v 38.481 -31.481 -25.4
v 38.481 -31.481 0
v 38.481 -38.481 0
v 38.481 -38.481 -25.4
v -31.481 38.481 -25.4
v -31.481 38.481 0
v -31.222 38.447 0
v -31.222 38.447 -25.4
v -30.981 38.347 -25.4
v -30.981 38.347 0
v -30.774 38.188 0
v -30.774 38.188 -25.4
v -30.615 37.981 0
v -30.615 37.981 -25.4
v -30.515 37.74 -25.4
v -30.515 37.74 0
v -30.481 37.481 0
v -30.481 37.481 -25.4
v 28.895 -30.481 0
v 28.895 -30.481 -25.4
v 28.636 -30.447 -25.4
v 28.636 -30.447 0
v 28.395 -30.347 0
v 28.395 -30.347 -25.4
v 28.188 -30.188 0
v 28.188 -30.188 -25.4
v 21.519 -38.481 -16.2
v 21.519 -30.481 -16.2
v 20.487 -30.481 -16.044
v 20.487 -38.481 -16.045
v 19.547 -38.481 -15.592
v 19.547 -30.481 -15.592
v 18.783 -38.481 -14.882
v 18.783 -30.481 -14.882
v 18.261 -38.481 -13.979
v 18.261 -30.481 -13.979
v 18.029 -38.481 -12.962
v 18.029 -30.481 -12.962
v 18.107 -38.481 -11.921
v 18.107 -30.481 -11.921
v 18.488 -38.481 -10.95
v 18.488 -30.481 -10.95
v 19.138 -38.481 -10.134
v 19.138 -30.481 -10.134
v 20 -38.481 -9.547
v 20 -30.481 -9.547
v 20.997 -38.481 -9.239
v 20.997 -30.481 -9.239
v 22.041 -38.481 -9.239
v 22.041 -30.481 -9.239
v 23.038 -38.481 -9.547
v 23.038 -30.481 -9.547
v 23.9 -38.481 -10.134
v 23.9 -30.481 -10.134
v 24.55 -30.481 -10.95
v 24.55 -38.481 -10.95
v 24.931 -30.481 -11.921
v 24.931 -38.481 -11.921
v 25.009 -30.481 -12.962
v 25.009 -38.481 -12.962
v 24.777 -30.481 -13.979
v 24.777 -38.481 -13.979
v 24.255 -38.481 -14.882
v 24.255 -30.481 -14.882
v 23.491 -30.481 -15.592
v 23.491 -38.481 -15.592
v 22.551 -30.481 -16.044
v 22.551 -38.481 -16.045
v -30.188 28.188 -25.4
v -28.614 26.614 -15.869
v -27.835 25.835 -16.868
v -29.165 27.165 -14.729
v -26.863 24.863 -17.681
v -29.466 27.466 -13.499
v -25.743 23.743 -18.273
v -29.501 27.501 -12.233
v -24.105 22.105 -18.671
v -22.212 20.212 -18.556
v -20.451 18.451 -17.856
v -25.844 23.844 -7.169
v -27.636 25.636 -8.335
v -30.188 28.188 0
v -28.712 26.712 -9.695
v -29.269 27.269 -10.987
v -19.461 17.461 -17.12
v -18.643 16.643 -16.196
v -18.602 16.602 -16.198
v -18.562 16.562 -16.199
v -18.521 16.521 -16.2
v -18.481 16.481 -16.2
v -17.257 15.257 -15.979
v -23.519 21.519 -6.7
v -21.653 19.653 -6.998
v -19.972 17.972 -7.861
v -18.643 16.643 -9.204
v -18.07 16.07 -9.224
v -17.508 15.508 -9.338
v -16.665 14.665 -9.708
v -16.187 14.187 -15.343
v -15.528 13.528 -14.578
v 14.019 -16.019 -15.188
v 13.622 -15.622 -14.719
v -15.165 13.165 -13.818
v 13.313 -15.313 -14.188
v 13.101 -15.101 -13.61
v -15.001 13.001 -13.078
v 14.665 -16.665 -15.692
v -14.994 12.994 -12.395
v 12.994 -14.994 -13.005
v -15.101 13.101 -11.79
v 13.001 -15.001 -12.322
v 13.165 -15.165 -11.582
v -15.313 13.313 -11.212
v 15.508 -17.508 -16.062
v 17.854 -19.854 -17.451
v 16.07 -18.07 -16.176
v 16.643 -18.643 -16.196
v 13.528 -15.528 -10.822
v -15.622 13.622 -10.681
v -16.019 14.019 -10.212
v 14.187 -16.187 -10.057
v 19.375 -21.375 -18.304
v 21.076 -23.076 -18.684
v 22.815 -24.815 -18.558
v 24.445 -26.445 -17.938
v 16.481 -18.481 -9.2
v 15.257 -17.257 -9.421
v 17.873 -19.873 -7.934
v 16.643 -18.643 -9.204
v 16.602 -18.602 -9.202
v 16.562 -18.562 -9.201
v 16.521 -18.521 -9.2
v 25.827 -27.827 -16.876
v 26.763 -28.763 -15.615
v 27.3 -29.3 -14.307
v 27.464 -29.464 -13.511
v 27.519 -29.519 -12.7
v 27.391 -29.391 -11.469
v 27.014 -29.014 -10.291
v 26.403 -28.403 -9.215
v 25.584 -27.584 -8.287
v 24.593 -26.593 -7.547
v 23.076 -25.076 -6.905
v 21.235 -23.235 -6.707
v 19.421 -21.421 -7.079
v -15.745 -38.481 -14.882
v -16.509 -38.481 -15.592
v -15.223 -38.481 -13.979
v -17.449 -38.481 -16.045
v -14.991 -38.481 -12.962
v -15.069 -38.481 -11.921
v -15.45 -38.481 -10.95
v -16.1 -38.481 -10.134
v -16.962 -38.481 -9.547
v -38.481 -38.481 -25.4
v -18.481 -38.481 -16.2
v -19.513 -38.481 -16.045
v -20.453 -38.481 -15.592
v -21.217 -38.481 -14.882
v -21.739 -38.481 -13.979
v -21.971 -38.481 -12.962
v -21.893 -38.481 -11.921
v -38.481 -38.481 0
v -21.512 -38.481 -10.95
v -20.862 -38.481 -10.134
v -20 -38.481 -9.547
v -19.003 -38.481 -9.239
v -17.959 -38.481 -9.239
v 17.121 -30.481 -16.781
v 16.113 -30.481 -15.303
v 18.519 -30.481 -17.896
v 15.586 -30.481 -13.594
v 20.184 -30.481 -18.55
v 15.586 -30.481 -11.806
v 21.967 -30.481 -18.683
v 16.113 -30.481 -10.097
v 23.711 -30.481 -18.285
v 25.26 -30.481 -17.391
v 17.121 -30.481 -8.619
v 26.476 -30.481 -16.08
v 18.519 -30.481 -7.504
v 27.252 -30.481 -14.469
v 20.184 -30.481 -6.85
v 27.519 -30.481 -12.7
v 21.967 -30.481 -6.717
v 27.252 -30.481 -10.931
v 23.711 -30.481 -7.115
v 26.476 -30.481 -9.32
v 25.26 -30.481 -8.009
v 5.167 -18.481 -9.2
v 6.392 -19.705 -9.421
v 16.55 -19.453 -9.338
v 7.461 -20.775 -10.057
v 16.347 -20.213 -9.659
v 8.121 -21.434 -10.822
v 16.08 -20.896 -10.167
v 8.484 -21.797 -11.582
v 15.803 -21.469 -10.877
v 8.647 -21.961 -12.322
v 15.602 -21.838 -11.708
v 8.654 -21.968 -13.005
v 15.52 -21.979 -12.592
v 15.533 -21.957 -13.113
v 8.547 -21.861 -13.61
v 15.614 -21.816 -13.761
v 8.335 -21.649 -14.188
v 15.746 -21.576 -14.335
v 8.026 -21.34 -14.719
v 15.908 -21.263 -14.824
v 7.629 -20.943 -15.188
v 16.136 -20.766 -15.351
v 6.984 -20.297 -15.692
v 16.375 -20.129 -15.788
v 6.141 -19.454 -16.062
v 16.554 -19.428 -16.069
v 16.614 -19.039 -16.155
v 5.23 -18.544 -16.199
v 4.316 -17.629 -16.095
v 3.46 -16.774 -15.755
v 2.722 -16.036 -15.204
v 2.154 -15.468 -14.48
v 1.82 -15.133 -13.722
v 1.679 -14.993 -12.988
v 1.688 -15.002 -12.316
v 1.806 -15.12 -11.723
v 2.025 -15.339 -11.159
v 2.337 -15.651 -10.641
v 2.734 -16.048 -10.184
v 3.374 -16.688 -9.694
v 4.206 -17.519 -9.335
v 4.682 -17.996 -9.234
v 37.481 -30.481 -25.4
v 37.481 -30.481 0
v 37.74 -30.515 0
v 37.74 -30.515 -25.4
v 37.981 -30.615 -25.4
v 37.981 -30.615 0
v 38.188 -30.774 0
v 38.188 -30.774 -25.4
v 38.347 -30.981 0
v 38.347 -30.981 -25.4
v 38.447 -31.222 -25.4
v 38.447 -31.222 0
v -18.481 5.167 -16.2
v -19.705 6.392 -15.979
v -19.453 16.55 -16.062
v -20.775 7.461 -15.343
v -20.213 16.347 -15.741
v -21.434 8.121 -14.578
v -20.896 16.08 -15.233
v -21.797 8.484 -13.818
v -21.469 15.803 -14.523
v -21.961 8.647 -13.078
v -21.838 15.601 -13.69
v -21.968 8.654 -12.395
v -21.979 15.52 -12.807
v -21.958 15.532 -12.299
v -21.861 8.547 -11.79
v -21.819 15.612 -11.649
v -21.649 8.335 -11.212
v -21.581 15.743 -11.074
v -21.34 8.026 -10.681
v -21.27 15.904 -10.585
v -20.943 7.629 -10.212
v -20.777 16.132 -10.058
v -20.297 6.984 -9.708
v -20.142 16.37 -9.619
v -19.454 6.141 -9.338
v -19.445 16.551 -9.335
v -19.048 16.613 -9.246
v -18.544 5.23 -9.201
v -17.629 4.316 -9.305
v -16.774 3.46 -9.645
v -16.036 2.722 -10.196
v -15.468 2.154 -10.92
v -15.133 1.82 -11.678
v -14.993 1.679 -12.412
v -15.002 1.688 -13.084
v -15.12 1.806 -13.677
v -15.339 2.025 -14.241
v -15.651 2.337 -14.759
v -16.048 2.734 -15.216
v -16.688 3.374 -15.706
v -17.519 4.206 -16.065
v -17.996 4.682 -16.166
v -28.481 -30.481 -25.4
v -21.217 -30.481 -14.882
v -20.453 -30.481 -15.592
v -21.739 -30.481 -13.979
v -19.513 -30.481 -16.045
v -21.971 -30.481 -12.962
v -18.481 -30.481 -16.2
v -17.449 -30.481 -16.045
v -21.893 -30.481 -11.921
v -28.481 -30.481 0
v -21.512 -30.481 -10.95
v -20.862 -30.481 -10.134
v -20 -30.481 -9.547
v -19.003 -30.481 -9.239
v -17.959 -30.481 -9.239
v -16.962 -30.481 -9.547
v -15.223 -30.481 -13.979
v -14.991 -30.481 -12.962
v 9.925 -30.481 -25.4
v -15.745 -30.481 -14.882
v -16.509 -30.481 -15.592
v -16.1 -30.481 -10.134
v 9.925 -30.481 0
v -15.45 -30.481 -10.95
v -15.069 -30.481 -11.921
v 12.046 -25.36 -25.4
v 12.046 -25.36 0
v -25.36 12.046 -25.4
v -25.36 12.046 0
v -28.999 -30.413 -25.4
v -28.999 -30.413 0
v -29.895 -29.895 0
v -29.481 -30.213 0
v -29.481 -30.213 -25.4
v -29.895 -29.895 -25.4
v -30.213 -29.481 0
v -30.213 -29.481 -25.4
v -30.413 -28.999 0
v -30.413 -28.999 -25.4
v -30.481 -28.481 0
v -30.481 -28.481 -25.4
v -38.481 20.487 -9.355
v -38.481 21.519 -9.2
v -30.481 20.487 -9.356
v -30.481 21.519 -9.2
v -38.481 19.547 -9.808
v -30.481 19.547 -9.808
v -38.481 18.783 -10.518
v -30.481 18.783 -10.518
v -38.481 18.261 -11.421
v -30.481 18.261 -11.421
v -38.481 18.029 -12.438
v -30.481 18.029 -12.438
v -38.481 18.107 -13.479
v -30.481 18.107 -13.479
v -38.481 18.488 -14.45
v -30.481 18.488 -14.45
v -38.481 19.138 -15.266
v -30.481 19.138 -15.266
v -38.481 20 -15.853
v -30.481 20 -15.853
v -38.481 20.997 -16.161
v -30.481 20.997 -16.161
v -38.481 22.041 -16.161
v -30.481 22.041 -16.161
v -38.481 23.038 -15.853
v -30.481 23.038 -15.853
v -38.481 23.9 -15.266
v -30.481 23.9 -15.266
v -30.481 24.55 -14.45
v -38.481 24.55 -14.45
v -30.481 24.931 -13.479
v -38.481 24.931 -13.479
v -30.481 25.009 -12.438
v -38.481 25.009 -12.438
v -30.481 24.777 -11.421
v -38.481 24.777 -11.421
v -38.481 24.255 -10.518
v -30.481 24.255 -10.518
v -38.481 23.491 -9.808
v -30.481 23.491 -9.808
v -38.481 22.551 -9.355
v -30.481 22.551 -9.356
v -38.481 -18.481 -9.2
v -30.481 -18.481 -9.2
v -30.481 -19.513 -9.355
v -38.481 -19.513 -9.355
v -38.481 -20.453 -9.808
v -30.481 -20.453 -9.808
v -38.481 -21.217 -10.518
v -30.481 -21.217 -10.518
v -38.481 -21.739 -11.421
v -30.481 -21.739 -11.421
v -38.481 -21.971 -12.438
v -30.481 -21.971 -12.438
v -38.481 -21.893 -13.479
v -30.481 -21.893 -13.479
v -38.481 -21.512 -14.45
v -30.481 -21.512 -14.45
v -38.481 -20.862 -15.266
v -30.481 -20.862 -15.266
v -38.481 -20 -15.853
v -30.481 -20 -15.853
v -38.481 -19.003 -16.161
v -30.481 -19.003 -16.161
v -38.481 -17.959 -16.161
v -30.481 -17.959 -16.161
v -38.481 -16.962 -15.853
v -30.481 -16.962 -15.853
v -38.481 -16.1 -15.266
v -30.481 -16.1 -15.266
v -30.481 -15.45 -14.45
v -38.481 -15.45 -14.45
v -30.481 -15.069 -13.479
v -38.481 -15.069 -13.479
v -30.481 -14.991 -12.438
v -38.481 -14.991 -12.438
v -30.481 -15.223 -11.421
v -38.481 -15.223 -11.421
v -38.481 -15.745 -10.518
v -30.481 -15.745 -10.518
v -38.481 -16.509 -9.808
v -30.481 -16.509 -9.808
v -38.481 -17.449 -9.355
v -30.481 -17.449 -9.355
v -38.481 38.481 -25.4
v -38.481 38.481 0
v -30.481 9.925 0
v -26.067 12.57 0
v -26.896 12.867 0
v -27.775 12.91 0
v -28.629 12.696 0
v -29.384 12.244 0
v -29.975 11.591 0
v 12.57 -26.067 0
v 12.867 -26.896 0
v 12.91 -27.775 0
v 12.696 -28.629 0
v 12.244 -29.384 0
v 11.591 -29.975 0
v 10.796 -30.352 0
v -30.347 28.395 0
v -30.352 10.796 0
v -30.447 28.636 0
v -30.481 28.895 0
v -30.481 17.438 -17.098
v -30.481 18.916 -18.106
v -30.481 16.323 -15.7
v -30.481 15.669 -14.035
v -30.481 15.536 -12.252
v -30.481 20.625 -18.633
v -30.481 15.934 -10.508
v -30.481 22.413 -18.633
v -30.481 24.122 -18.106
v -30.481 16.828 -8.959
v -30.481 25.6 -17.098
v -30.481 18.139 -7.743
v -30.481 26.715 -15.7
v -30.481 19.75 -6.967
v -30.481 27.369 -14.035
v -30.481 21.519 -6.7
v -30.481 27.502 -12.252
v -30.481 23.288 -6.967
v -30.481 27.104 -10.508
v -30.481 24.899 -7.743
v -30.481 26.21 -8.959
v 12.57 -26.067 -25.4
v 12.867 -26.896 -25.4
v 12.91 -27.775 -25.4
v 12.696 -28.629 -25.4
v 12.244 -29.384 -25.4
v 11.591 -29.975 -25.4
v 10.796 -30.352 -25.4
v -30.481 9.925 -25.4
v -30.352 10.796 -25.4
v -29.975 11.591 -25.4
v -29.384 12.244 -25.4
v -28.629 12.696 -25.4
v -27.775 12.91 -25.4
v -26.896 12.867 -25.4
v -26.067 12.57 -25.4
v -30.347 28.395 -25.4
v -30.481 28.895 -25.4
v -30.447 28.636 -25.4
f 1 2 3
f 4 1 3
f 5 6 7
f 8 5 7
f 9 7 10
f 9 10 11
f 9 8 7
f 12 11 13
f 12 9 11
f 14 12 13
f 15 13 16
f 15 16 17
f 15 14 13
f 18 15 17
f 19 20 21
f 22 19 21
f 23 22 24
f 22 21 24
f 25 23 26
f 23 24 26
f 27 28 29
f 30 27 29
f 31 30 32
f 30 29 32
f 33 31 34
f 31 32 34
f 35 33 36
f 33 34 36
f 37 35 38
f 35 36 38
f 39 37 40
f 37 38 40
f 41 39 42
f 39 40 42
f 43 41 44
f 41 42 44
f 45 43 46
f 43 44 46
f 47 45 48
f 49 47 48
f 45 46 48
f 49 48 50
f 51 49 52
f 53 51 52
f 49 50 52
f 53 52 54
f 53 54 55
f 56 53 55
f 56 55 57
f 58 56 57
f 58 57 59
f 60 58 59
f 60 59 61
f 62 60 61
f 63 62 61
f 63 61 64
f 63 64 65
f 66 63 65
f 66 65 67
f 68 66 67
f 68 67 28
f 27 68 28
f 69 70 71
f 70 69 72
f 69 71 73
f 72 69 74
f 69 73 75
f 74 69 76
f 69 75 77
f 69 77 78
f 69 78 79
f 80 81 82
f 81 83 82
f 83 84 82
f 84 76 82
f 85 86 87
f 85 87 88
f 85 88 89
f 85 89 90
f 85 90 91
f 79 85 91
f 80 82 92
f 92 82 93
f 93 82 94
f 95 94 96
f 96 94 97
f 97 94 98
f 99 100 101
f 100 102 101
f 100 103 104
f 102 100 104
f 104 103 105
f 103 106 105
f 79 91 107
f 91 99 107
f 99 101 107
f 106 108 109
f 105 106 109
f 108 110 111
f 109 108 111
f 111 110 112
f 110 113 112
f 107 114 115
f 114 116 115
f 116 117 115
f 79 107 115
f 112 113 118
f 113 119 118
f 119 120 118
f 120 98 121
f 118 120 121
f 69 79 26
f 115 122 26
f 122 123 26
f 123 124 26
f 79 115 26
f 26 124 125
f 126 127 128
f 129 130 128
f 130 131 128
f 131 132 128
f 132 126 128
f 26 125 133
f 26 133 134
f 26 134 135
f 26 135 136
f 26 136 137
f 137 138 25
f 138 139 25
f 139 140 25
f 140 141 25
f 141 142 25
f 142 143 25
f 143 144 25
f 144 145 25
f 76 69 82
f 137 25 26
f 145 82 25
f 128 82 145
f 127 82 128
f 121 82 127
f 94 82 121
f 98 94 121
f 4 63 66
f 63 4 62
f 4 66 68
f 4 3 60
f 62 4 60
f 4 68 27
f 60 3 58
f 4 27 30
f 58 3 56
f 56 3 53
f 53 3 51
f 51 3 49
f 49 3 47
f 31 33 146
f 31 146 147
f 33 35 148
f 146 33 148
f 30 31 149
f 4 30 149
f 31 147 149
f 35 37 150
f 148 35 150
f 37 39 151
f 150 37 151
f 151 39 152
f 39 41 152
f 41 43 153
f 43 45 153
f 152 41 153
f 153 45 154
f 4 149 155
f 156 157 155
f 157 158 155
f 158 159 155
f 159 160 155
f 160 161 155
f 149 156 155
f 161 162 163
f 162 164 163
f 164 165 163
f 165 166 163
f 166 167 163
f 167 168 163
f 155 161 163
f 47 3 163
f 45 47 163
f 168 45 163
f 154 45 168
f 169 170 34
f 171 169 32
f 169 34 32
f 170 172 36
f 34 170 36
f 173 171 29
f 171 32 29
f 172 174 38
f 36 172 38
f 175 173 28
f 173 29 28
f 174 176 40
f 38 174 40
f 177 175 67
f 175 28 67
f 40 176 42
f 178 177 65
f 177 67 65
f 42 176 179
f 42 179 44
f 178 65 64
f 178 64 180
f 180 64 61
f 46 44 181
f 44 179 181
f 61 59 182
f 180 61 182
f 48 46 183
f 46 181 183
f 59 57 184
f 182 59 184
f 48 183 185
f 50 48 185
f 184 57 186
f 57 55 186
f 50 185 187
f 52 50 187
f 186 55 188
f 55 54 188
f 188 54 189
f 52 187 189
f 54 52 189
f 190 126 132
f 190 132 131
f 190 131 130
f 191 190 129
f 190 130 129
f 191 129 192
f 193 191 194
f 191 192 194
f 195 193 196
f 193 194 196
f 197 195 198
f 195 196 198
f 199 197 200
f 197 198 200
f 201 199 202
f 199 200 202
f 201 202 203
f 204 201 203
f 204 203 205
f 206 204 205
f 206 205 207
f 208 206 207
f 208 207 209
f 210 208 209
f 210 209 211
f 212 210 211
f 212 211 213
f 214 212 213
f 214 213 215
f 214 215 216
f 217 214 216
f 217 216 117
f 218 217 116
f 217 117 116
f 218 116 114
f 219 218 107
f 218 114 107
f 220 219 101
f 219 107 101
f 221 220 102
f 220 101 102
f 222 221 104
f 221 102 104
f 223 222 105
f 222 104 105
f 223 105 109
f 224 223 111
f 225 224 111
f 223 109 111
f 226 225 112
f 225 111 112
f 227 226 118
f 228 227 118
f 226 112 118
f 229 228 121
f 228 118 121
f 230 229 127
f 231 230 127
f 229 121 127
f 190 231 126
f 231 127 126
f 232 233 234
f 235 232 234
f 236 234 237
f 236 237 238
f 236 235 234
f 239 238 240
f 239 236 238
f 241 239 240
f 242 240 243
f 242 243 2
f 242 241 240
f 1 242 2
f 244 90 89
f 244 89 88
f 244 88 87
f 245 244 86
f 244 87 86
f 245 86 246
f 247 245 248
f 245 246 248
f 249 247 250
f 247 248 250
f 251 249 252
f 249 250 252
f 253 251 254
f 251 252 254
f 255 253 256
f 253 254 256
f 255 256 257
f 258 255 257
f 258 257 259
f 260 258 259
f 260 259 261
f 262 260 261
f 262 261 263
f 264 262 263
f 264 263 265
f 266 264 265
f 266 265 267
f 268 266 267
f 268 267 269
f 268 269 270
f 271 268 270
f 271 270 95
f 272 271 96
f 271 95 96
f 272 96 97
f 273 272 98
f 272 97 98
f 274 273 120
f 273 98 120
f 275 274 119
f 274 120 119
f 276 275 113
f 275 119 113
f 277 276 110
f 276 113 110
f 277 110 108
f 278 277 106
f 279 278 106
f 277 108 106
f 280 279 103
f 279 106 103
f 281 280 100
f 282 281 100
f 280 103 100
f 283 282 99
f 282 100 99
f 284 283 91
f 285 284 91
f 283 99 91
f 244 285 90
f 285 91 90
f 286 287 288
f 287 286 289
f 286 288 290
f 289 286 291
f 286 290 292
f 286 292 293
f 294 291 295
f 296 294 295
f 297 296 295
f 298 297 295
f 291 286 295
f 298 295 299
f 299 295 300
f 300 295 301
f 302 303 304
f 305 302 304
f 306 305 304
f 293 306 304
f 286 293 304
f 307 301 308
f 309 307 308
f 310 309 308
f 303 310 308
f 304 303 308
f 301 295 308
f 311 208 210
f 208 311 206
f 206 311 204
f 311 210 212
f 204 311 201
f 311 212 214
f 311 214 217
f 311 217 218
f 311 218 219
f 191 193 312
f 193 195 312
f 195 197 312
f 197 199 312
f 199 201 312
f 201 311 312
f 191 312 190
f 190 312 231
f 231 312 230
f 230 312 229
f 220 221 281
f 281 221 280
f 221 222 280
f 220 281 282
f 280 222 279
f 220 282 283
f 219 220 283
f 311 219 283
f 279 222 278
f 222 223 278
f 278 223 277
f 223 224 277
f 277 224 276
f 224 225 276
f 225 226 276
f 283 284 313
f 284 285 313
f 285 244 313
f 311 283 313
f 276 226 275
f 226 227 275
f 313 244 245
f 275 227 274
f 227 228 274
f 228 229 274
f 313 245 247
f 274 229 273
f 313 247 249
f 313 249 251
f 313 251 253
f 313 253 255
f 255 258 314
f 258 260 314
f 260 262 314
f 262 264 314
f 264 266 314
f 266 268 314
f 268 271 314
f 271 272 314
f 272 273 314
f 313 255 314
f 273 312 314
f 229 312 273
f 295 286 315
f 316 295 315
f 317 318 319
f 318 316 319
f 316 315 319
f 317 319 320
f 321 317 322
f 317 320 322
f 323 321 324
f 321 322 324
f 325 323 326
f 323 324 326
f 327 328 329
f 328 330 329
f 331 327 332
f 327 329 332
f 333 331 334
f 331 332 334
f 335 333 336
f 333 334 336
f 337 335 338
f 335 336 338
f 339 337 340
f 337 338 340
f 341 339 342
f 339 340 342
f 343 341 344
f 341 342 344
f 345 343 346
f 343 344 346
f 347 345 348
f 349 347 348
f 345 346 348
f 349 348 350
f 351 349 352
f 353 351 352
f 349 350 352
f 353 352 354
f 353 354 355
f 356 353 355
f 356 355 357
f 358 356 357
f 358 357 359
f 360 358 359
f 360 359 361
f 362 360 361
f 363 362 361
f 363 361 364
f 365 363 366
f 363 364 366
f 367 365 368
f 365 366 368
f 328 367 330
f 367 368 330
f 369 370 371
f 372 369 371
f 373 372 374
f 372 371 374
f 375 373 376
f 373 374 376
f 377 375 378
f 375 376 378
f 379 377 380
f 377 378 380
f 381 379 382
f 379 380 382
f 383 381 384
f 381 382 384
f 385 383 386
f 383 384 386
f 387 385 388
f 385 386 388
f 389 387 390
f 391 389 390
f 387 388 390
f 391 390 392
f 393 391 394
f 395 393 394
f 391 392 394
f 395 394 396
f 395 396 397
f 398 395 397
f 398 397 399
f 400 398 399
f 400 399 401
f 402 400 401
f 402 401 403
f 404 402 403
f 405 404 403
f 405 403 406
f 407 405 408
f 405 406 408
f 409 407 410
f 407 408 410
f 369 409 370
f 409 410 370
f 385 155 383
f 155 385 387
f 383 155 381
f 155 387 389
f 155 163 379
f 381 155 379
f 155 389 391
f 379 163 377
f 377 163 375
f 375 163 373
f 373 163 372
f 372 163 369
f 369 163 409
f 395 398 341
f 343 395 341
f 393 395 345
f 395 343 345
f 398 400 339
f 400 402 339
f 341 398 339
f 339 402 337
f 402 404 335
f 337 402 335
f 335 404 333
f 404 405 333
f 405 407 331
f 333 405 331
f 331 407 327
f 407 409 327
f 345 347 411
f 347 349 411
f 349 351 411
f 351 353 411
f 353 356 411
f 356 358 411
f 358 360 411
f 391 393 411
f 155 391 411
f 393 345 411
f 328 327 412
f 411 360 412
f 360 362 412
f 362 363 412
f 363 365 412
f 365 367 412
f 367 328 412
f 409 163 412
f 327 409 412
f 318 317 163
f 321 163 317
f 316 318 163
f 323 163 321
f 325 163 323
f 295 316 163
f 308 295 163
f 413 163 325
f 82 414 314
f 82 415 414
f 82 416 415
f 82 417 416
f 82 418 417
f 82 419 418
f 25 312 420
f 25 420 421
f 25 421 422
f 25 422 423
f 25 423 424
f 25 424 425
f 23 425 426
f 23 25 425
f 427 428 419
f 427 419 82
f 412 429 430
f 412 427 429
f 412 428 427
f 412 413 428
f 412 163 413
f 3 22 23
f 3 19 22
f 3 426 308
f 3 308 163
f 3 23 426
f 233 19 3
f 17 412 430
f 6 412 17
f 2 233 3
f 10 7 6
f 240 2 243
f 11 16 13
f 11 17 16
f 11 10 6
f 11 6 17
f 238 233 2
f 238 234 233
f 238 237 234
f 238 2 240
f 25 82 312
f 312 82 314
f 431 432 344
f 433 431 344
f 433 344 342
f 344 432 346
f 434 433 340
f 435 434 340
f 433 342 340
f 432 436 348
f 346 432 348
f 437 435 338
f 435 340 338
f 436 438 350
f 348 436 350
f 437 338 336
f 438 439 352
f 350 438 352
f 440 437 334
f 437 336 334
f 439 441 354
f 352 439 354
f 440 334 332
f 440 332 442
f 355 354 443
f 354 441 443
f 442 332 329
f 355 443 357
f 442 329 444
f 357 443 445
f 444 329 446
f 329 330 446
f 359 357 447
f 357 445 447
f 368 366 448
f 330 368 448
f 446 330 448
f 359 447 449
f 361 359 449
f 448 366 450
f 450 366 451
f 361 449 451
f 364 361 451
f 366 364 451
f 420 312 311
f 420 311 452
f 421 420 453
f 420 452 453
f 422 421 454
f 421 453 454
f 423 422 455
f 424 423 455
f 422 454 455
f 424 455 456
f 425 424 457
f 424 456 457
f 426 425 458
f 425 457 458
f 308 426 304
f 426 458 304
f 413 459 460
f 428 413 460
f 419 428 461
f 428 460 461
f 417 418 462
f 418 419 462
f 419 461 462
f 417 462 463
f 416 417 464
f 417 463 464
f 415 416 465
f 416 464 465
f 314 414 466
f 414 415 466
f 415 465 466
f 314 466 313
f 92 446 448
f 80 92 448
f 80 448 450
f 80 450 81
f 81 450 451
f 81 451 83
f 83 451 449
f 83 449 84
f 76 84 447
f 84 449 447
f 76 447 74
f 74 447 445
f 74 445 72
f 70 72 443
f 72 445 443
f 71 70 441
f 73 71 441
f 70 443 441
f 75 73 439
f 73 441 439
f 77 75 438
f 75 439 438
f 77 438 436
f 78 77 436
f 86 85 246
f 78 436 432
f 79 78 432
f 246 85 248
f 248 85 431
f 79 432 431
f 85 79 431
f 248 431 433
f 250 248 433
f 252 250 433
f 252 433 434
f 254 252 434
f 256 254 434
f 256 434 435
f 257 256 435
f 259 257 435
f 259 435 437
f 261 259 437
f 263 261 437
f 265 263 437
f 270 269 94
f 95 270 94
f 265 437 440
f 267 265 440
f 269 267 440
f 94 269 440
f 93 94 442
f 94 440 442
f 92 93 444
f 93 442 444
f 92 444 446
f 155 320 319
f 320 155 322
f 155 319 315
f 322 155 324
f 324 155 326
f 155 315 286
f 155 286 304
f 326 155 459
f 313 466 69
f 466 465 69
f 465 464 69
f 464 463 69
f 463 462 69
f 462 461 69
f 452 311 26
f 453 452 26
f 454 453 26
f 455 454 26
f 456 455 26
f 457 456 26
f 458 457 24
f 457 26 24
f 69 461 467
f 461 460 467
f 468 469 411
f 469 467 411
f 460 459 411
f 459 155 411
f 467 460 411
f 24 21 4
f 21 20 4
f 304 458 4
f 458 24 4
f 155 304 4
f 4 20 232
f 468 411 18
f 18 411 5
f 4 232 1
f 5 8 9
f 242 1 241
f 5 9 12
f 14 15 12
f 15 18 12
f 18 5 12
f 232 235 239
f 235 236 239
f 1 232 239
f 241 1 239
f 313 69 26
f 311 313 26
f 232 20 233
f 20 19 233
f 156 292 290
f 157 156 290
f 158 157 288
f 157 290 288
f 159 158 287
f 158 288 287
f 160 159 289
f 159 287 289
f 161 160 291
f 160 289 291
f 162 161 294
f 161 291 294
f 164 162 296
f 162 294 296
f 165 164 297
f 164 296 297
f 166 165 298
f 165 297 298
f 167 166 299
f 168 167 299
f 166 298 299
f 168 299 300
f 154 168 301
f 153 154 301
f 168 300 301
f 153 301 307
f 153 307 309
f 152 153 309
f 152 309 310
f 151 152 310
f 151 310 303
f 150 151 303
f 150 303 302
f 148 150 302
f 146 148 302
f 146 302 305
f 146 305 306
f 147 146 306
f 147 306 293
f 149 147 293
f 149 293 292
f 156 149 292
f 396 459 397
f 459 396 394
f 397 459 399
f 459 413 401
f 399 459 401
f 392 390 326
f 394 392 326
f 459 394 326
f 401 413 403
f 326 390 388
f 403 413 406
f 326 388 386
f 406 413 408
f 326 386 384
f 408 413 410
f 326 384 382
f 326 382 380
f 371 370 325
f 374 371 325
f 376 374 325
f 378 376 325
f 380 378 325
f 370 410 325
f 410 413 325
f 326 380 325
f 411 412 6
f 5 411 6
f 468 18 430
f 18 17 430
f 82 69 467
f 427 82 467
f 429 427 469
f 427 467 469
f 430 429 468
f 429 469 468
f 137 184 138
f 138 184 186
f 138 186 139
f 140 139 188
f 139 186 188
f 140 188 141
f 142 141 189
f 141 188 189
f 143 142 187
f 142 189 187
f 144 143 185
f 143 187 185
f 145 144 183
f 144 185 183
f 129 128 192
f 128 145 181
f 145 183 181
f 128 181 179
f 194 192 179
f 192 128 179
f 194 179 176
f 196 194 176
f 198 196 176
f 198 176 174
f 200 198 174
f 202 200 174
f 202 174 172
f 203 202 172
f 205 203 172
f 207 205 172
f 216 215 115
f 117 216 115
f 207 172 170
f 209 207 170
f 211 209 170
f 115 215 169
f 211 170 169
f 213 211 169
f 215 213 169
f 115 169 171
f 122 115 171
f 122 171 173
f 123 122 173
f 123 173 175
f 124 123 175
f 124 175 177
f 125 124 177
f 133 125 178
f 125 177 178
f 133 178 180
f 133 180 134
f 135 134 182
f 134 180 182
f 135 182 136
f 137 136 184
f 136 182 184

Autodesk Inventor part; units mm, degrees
ref_plane "YZ Plane" through (0, 0, 0) normal (1, 0, 0) x (0, 1, 0)
sketch "Sketch1" plane through (0, 0, 0) normal (0, 0, 1) x (1, 0, 0)
  line L0 (-38.481, 38.481) -> (38.481, 38.481)
  line L1 (38.481, 38.481) -> (38.481, -38.481)
  line L2 (38.481, -38.481) -> (-38.481, -38.481)
  line L3 (-38.481, -38.481) -> (-38.481, 38.481)
  point P0 (0, 0)
  dimension "d0" = 76.962
  dimension "d1" = 76.962
  dimension "d2" = 38.481
  dimension "d3" = 38.481
extrude "Extrusion1" add sketch "Sketch1" against normal blind 25.4
sketch "Sketch2" plane through (0, 0, 0) normal (0, 0, 1) x (1, 0, 0)
  line L0 (-38.481, 38.481) -> (38.481, 38.481) projected
  line L1 (-38.481, -38.481) -> (-38.481, 38.481) projected
  line L2 (38.481, -38.481) -> (-38.481, -38.481) projected
  line L3 (38.481, 38.481) -> (38.481, -38.481) projected
  line L4 (-30.481, 38.481) -> (-30.481, 28.481)
  line L5 (-30.481, 28.481) -> (28.481, -30.481)
  line L6 (28.481, -30.481) -> (38.481, -30.481)
  line L7 (-30.481, 17.1673) -> (-30.481, -30.481)
  line L8 (-30.481, -30.481) -> (17.1673, -30.481)
  line L9 (17.1673, -30.481) -> (-30.481, 17.1673)
  dimension "d6" = 8
  dimension "d7" = 8
  dimension "d8" = 10
  dimension "d10" = 135
  dimension "d11" = 8
extrude "Extrusion2" cut sketch "Sketch2" against normal through all contours L0 L3 L6 L5 L4 | L9 L8 L7
fillet "Fillet1" radius 2 1 edges at (-30.481, -30.481, -12.7)
fillet "Fillet1" radius 1 4 edges at (-30.481, 38.481, -12.7) (-30.481, 28.481, -12.7) (28.481, -30.481, -12.7) (38.481, -30.481, -12.7)
fillet "Fillet1" radius 3 2 edges at (-30.481, 17.1673, -12.7) (17.1673, -30.481, -12.7)
sketch "Sketch3" plane through (-38.481, -38.481, 0) normal (-1, 0, 0) x (0, 0, 1)
  line L0 (0, 0) -> (-25.4, 0) projected
  line L1 (0, 0) -> (0, 76.962) projected
  point P0 (-12.7, 60)
  point P1 (-12.7, 20)
  dimension "d17" = 12.7
  dimension "d18" = 20
  dimension "d19" = 40
hole "Hole1" at (-38.481, 21.519, -12.7) at (-38.481, -18.481, -12.7) direction (1, 0, 0) diameter 7 end through all
sketch "Sketch4" plane through (-38.481, -38.481, 0) normal (0, -1, 0) x (1, 0, 0)
  line L0 (0, -25.4) -> (76.962, -25.4) projected
  line L1 (0, 0) -> (0, -25.4) projected
  point P0 (20, -12.7)
  point P1 (60, -12.7)
  dimension "d27" = 12.7
  dimension "d28" = 20
  dimension "d29" = 40
hole "Hole2" at (-18.481, -38.481, -12.7) at (21.519, -38.481, -12.7) direction (0, 1, 0) diameter 7 end through all
ref_plane "Work Plane1" through (-30.481, -38.481, 0) normal (-1, 0, 0) x (0, 0, 1)
ref_plane "Work Plane2" through (-38.481, -30.481, 0) normal (0, -1, 0) x (1, 0, 0)
sketch "Sketch5" plane through (-30.481, -38.481, 0) normal (-1, 0, 0) x (0, 0, 1)
  arc A0 (-15.1299, 57.481) -> (-10.2701, 57.481) centre (-12.7, 60) ccw projected
  arc A1 (-10.2701, 57.481) -> (-15.1299, 57.481) centre (-12.7, 60) ccw projected
  circle A2 centre (-12.7, 60) radius 3.5 projected
  circle A3 centre (-12.7, 60) radius 6
  dimension "d39" = 12
extrude "Extrusion3" cut sketch "Sketch5" against normal through all
sketch "Sketch6" plane through (-38.481, -30.481, 0) normal (0, -1, 0) x (1, 0, 0)
  arc A0 (57.481, -10.2701) -> (57.481, -15.1299) centre (60, -12.7) ccw projected
  arc A1 (57.481, -15.1299) -> (57.481, -10.2701) centre (60, -12.7) ccw projected
  circle A2 centre (60, -12.7) radius 3.5 projected
  circle A3 centre (60, -12.7) radius 6
  dimension "d42" = 12
extrude "Extrusion4" cut sketch "Sketch6" against normal through all
ref_plane "OffsetPlane" through (0, 0, -12.7) normal (0, 0, 1) x (1, 0, 0)
equation "\"d2\" = 0.5 * d0"
equation "\"d3\" = 0.5 * d1"
properties part number "20-101" material "Alluminio - 6061"
